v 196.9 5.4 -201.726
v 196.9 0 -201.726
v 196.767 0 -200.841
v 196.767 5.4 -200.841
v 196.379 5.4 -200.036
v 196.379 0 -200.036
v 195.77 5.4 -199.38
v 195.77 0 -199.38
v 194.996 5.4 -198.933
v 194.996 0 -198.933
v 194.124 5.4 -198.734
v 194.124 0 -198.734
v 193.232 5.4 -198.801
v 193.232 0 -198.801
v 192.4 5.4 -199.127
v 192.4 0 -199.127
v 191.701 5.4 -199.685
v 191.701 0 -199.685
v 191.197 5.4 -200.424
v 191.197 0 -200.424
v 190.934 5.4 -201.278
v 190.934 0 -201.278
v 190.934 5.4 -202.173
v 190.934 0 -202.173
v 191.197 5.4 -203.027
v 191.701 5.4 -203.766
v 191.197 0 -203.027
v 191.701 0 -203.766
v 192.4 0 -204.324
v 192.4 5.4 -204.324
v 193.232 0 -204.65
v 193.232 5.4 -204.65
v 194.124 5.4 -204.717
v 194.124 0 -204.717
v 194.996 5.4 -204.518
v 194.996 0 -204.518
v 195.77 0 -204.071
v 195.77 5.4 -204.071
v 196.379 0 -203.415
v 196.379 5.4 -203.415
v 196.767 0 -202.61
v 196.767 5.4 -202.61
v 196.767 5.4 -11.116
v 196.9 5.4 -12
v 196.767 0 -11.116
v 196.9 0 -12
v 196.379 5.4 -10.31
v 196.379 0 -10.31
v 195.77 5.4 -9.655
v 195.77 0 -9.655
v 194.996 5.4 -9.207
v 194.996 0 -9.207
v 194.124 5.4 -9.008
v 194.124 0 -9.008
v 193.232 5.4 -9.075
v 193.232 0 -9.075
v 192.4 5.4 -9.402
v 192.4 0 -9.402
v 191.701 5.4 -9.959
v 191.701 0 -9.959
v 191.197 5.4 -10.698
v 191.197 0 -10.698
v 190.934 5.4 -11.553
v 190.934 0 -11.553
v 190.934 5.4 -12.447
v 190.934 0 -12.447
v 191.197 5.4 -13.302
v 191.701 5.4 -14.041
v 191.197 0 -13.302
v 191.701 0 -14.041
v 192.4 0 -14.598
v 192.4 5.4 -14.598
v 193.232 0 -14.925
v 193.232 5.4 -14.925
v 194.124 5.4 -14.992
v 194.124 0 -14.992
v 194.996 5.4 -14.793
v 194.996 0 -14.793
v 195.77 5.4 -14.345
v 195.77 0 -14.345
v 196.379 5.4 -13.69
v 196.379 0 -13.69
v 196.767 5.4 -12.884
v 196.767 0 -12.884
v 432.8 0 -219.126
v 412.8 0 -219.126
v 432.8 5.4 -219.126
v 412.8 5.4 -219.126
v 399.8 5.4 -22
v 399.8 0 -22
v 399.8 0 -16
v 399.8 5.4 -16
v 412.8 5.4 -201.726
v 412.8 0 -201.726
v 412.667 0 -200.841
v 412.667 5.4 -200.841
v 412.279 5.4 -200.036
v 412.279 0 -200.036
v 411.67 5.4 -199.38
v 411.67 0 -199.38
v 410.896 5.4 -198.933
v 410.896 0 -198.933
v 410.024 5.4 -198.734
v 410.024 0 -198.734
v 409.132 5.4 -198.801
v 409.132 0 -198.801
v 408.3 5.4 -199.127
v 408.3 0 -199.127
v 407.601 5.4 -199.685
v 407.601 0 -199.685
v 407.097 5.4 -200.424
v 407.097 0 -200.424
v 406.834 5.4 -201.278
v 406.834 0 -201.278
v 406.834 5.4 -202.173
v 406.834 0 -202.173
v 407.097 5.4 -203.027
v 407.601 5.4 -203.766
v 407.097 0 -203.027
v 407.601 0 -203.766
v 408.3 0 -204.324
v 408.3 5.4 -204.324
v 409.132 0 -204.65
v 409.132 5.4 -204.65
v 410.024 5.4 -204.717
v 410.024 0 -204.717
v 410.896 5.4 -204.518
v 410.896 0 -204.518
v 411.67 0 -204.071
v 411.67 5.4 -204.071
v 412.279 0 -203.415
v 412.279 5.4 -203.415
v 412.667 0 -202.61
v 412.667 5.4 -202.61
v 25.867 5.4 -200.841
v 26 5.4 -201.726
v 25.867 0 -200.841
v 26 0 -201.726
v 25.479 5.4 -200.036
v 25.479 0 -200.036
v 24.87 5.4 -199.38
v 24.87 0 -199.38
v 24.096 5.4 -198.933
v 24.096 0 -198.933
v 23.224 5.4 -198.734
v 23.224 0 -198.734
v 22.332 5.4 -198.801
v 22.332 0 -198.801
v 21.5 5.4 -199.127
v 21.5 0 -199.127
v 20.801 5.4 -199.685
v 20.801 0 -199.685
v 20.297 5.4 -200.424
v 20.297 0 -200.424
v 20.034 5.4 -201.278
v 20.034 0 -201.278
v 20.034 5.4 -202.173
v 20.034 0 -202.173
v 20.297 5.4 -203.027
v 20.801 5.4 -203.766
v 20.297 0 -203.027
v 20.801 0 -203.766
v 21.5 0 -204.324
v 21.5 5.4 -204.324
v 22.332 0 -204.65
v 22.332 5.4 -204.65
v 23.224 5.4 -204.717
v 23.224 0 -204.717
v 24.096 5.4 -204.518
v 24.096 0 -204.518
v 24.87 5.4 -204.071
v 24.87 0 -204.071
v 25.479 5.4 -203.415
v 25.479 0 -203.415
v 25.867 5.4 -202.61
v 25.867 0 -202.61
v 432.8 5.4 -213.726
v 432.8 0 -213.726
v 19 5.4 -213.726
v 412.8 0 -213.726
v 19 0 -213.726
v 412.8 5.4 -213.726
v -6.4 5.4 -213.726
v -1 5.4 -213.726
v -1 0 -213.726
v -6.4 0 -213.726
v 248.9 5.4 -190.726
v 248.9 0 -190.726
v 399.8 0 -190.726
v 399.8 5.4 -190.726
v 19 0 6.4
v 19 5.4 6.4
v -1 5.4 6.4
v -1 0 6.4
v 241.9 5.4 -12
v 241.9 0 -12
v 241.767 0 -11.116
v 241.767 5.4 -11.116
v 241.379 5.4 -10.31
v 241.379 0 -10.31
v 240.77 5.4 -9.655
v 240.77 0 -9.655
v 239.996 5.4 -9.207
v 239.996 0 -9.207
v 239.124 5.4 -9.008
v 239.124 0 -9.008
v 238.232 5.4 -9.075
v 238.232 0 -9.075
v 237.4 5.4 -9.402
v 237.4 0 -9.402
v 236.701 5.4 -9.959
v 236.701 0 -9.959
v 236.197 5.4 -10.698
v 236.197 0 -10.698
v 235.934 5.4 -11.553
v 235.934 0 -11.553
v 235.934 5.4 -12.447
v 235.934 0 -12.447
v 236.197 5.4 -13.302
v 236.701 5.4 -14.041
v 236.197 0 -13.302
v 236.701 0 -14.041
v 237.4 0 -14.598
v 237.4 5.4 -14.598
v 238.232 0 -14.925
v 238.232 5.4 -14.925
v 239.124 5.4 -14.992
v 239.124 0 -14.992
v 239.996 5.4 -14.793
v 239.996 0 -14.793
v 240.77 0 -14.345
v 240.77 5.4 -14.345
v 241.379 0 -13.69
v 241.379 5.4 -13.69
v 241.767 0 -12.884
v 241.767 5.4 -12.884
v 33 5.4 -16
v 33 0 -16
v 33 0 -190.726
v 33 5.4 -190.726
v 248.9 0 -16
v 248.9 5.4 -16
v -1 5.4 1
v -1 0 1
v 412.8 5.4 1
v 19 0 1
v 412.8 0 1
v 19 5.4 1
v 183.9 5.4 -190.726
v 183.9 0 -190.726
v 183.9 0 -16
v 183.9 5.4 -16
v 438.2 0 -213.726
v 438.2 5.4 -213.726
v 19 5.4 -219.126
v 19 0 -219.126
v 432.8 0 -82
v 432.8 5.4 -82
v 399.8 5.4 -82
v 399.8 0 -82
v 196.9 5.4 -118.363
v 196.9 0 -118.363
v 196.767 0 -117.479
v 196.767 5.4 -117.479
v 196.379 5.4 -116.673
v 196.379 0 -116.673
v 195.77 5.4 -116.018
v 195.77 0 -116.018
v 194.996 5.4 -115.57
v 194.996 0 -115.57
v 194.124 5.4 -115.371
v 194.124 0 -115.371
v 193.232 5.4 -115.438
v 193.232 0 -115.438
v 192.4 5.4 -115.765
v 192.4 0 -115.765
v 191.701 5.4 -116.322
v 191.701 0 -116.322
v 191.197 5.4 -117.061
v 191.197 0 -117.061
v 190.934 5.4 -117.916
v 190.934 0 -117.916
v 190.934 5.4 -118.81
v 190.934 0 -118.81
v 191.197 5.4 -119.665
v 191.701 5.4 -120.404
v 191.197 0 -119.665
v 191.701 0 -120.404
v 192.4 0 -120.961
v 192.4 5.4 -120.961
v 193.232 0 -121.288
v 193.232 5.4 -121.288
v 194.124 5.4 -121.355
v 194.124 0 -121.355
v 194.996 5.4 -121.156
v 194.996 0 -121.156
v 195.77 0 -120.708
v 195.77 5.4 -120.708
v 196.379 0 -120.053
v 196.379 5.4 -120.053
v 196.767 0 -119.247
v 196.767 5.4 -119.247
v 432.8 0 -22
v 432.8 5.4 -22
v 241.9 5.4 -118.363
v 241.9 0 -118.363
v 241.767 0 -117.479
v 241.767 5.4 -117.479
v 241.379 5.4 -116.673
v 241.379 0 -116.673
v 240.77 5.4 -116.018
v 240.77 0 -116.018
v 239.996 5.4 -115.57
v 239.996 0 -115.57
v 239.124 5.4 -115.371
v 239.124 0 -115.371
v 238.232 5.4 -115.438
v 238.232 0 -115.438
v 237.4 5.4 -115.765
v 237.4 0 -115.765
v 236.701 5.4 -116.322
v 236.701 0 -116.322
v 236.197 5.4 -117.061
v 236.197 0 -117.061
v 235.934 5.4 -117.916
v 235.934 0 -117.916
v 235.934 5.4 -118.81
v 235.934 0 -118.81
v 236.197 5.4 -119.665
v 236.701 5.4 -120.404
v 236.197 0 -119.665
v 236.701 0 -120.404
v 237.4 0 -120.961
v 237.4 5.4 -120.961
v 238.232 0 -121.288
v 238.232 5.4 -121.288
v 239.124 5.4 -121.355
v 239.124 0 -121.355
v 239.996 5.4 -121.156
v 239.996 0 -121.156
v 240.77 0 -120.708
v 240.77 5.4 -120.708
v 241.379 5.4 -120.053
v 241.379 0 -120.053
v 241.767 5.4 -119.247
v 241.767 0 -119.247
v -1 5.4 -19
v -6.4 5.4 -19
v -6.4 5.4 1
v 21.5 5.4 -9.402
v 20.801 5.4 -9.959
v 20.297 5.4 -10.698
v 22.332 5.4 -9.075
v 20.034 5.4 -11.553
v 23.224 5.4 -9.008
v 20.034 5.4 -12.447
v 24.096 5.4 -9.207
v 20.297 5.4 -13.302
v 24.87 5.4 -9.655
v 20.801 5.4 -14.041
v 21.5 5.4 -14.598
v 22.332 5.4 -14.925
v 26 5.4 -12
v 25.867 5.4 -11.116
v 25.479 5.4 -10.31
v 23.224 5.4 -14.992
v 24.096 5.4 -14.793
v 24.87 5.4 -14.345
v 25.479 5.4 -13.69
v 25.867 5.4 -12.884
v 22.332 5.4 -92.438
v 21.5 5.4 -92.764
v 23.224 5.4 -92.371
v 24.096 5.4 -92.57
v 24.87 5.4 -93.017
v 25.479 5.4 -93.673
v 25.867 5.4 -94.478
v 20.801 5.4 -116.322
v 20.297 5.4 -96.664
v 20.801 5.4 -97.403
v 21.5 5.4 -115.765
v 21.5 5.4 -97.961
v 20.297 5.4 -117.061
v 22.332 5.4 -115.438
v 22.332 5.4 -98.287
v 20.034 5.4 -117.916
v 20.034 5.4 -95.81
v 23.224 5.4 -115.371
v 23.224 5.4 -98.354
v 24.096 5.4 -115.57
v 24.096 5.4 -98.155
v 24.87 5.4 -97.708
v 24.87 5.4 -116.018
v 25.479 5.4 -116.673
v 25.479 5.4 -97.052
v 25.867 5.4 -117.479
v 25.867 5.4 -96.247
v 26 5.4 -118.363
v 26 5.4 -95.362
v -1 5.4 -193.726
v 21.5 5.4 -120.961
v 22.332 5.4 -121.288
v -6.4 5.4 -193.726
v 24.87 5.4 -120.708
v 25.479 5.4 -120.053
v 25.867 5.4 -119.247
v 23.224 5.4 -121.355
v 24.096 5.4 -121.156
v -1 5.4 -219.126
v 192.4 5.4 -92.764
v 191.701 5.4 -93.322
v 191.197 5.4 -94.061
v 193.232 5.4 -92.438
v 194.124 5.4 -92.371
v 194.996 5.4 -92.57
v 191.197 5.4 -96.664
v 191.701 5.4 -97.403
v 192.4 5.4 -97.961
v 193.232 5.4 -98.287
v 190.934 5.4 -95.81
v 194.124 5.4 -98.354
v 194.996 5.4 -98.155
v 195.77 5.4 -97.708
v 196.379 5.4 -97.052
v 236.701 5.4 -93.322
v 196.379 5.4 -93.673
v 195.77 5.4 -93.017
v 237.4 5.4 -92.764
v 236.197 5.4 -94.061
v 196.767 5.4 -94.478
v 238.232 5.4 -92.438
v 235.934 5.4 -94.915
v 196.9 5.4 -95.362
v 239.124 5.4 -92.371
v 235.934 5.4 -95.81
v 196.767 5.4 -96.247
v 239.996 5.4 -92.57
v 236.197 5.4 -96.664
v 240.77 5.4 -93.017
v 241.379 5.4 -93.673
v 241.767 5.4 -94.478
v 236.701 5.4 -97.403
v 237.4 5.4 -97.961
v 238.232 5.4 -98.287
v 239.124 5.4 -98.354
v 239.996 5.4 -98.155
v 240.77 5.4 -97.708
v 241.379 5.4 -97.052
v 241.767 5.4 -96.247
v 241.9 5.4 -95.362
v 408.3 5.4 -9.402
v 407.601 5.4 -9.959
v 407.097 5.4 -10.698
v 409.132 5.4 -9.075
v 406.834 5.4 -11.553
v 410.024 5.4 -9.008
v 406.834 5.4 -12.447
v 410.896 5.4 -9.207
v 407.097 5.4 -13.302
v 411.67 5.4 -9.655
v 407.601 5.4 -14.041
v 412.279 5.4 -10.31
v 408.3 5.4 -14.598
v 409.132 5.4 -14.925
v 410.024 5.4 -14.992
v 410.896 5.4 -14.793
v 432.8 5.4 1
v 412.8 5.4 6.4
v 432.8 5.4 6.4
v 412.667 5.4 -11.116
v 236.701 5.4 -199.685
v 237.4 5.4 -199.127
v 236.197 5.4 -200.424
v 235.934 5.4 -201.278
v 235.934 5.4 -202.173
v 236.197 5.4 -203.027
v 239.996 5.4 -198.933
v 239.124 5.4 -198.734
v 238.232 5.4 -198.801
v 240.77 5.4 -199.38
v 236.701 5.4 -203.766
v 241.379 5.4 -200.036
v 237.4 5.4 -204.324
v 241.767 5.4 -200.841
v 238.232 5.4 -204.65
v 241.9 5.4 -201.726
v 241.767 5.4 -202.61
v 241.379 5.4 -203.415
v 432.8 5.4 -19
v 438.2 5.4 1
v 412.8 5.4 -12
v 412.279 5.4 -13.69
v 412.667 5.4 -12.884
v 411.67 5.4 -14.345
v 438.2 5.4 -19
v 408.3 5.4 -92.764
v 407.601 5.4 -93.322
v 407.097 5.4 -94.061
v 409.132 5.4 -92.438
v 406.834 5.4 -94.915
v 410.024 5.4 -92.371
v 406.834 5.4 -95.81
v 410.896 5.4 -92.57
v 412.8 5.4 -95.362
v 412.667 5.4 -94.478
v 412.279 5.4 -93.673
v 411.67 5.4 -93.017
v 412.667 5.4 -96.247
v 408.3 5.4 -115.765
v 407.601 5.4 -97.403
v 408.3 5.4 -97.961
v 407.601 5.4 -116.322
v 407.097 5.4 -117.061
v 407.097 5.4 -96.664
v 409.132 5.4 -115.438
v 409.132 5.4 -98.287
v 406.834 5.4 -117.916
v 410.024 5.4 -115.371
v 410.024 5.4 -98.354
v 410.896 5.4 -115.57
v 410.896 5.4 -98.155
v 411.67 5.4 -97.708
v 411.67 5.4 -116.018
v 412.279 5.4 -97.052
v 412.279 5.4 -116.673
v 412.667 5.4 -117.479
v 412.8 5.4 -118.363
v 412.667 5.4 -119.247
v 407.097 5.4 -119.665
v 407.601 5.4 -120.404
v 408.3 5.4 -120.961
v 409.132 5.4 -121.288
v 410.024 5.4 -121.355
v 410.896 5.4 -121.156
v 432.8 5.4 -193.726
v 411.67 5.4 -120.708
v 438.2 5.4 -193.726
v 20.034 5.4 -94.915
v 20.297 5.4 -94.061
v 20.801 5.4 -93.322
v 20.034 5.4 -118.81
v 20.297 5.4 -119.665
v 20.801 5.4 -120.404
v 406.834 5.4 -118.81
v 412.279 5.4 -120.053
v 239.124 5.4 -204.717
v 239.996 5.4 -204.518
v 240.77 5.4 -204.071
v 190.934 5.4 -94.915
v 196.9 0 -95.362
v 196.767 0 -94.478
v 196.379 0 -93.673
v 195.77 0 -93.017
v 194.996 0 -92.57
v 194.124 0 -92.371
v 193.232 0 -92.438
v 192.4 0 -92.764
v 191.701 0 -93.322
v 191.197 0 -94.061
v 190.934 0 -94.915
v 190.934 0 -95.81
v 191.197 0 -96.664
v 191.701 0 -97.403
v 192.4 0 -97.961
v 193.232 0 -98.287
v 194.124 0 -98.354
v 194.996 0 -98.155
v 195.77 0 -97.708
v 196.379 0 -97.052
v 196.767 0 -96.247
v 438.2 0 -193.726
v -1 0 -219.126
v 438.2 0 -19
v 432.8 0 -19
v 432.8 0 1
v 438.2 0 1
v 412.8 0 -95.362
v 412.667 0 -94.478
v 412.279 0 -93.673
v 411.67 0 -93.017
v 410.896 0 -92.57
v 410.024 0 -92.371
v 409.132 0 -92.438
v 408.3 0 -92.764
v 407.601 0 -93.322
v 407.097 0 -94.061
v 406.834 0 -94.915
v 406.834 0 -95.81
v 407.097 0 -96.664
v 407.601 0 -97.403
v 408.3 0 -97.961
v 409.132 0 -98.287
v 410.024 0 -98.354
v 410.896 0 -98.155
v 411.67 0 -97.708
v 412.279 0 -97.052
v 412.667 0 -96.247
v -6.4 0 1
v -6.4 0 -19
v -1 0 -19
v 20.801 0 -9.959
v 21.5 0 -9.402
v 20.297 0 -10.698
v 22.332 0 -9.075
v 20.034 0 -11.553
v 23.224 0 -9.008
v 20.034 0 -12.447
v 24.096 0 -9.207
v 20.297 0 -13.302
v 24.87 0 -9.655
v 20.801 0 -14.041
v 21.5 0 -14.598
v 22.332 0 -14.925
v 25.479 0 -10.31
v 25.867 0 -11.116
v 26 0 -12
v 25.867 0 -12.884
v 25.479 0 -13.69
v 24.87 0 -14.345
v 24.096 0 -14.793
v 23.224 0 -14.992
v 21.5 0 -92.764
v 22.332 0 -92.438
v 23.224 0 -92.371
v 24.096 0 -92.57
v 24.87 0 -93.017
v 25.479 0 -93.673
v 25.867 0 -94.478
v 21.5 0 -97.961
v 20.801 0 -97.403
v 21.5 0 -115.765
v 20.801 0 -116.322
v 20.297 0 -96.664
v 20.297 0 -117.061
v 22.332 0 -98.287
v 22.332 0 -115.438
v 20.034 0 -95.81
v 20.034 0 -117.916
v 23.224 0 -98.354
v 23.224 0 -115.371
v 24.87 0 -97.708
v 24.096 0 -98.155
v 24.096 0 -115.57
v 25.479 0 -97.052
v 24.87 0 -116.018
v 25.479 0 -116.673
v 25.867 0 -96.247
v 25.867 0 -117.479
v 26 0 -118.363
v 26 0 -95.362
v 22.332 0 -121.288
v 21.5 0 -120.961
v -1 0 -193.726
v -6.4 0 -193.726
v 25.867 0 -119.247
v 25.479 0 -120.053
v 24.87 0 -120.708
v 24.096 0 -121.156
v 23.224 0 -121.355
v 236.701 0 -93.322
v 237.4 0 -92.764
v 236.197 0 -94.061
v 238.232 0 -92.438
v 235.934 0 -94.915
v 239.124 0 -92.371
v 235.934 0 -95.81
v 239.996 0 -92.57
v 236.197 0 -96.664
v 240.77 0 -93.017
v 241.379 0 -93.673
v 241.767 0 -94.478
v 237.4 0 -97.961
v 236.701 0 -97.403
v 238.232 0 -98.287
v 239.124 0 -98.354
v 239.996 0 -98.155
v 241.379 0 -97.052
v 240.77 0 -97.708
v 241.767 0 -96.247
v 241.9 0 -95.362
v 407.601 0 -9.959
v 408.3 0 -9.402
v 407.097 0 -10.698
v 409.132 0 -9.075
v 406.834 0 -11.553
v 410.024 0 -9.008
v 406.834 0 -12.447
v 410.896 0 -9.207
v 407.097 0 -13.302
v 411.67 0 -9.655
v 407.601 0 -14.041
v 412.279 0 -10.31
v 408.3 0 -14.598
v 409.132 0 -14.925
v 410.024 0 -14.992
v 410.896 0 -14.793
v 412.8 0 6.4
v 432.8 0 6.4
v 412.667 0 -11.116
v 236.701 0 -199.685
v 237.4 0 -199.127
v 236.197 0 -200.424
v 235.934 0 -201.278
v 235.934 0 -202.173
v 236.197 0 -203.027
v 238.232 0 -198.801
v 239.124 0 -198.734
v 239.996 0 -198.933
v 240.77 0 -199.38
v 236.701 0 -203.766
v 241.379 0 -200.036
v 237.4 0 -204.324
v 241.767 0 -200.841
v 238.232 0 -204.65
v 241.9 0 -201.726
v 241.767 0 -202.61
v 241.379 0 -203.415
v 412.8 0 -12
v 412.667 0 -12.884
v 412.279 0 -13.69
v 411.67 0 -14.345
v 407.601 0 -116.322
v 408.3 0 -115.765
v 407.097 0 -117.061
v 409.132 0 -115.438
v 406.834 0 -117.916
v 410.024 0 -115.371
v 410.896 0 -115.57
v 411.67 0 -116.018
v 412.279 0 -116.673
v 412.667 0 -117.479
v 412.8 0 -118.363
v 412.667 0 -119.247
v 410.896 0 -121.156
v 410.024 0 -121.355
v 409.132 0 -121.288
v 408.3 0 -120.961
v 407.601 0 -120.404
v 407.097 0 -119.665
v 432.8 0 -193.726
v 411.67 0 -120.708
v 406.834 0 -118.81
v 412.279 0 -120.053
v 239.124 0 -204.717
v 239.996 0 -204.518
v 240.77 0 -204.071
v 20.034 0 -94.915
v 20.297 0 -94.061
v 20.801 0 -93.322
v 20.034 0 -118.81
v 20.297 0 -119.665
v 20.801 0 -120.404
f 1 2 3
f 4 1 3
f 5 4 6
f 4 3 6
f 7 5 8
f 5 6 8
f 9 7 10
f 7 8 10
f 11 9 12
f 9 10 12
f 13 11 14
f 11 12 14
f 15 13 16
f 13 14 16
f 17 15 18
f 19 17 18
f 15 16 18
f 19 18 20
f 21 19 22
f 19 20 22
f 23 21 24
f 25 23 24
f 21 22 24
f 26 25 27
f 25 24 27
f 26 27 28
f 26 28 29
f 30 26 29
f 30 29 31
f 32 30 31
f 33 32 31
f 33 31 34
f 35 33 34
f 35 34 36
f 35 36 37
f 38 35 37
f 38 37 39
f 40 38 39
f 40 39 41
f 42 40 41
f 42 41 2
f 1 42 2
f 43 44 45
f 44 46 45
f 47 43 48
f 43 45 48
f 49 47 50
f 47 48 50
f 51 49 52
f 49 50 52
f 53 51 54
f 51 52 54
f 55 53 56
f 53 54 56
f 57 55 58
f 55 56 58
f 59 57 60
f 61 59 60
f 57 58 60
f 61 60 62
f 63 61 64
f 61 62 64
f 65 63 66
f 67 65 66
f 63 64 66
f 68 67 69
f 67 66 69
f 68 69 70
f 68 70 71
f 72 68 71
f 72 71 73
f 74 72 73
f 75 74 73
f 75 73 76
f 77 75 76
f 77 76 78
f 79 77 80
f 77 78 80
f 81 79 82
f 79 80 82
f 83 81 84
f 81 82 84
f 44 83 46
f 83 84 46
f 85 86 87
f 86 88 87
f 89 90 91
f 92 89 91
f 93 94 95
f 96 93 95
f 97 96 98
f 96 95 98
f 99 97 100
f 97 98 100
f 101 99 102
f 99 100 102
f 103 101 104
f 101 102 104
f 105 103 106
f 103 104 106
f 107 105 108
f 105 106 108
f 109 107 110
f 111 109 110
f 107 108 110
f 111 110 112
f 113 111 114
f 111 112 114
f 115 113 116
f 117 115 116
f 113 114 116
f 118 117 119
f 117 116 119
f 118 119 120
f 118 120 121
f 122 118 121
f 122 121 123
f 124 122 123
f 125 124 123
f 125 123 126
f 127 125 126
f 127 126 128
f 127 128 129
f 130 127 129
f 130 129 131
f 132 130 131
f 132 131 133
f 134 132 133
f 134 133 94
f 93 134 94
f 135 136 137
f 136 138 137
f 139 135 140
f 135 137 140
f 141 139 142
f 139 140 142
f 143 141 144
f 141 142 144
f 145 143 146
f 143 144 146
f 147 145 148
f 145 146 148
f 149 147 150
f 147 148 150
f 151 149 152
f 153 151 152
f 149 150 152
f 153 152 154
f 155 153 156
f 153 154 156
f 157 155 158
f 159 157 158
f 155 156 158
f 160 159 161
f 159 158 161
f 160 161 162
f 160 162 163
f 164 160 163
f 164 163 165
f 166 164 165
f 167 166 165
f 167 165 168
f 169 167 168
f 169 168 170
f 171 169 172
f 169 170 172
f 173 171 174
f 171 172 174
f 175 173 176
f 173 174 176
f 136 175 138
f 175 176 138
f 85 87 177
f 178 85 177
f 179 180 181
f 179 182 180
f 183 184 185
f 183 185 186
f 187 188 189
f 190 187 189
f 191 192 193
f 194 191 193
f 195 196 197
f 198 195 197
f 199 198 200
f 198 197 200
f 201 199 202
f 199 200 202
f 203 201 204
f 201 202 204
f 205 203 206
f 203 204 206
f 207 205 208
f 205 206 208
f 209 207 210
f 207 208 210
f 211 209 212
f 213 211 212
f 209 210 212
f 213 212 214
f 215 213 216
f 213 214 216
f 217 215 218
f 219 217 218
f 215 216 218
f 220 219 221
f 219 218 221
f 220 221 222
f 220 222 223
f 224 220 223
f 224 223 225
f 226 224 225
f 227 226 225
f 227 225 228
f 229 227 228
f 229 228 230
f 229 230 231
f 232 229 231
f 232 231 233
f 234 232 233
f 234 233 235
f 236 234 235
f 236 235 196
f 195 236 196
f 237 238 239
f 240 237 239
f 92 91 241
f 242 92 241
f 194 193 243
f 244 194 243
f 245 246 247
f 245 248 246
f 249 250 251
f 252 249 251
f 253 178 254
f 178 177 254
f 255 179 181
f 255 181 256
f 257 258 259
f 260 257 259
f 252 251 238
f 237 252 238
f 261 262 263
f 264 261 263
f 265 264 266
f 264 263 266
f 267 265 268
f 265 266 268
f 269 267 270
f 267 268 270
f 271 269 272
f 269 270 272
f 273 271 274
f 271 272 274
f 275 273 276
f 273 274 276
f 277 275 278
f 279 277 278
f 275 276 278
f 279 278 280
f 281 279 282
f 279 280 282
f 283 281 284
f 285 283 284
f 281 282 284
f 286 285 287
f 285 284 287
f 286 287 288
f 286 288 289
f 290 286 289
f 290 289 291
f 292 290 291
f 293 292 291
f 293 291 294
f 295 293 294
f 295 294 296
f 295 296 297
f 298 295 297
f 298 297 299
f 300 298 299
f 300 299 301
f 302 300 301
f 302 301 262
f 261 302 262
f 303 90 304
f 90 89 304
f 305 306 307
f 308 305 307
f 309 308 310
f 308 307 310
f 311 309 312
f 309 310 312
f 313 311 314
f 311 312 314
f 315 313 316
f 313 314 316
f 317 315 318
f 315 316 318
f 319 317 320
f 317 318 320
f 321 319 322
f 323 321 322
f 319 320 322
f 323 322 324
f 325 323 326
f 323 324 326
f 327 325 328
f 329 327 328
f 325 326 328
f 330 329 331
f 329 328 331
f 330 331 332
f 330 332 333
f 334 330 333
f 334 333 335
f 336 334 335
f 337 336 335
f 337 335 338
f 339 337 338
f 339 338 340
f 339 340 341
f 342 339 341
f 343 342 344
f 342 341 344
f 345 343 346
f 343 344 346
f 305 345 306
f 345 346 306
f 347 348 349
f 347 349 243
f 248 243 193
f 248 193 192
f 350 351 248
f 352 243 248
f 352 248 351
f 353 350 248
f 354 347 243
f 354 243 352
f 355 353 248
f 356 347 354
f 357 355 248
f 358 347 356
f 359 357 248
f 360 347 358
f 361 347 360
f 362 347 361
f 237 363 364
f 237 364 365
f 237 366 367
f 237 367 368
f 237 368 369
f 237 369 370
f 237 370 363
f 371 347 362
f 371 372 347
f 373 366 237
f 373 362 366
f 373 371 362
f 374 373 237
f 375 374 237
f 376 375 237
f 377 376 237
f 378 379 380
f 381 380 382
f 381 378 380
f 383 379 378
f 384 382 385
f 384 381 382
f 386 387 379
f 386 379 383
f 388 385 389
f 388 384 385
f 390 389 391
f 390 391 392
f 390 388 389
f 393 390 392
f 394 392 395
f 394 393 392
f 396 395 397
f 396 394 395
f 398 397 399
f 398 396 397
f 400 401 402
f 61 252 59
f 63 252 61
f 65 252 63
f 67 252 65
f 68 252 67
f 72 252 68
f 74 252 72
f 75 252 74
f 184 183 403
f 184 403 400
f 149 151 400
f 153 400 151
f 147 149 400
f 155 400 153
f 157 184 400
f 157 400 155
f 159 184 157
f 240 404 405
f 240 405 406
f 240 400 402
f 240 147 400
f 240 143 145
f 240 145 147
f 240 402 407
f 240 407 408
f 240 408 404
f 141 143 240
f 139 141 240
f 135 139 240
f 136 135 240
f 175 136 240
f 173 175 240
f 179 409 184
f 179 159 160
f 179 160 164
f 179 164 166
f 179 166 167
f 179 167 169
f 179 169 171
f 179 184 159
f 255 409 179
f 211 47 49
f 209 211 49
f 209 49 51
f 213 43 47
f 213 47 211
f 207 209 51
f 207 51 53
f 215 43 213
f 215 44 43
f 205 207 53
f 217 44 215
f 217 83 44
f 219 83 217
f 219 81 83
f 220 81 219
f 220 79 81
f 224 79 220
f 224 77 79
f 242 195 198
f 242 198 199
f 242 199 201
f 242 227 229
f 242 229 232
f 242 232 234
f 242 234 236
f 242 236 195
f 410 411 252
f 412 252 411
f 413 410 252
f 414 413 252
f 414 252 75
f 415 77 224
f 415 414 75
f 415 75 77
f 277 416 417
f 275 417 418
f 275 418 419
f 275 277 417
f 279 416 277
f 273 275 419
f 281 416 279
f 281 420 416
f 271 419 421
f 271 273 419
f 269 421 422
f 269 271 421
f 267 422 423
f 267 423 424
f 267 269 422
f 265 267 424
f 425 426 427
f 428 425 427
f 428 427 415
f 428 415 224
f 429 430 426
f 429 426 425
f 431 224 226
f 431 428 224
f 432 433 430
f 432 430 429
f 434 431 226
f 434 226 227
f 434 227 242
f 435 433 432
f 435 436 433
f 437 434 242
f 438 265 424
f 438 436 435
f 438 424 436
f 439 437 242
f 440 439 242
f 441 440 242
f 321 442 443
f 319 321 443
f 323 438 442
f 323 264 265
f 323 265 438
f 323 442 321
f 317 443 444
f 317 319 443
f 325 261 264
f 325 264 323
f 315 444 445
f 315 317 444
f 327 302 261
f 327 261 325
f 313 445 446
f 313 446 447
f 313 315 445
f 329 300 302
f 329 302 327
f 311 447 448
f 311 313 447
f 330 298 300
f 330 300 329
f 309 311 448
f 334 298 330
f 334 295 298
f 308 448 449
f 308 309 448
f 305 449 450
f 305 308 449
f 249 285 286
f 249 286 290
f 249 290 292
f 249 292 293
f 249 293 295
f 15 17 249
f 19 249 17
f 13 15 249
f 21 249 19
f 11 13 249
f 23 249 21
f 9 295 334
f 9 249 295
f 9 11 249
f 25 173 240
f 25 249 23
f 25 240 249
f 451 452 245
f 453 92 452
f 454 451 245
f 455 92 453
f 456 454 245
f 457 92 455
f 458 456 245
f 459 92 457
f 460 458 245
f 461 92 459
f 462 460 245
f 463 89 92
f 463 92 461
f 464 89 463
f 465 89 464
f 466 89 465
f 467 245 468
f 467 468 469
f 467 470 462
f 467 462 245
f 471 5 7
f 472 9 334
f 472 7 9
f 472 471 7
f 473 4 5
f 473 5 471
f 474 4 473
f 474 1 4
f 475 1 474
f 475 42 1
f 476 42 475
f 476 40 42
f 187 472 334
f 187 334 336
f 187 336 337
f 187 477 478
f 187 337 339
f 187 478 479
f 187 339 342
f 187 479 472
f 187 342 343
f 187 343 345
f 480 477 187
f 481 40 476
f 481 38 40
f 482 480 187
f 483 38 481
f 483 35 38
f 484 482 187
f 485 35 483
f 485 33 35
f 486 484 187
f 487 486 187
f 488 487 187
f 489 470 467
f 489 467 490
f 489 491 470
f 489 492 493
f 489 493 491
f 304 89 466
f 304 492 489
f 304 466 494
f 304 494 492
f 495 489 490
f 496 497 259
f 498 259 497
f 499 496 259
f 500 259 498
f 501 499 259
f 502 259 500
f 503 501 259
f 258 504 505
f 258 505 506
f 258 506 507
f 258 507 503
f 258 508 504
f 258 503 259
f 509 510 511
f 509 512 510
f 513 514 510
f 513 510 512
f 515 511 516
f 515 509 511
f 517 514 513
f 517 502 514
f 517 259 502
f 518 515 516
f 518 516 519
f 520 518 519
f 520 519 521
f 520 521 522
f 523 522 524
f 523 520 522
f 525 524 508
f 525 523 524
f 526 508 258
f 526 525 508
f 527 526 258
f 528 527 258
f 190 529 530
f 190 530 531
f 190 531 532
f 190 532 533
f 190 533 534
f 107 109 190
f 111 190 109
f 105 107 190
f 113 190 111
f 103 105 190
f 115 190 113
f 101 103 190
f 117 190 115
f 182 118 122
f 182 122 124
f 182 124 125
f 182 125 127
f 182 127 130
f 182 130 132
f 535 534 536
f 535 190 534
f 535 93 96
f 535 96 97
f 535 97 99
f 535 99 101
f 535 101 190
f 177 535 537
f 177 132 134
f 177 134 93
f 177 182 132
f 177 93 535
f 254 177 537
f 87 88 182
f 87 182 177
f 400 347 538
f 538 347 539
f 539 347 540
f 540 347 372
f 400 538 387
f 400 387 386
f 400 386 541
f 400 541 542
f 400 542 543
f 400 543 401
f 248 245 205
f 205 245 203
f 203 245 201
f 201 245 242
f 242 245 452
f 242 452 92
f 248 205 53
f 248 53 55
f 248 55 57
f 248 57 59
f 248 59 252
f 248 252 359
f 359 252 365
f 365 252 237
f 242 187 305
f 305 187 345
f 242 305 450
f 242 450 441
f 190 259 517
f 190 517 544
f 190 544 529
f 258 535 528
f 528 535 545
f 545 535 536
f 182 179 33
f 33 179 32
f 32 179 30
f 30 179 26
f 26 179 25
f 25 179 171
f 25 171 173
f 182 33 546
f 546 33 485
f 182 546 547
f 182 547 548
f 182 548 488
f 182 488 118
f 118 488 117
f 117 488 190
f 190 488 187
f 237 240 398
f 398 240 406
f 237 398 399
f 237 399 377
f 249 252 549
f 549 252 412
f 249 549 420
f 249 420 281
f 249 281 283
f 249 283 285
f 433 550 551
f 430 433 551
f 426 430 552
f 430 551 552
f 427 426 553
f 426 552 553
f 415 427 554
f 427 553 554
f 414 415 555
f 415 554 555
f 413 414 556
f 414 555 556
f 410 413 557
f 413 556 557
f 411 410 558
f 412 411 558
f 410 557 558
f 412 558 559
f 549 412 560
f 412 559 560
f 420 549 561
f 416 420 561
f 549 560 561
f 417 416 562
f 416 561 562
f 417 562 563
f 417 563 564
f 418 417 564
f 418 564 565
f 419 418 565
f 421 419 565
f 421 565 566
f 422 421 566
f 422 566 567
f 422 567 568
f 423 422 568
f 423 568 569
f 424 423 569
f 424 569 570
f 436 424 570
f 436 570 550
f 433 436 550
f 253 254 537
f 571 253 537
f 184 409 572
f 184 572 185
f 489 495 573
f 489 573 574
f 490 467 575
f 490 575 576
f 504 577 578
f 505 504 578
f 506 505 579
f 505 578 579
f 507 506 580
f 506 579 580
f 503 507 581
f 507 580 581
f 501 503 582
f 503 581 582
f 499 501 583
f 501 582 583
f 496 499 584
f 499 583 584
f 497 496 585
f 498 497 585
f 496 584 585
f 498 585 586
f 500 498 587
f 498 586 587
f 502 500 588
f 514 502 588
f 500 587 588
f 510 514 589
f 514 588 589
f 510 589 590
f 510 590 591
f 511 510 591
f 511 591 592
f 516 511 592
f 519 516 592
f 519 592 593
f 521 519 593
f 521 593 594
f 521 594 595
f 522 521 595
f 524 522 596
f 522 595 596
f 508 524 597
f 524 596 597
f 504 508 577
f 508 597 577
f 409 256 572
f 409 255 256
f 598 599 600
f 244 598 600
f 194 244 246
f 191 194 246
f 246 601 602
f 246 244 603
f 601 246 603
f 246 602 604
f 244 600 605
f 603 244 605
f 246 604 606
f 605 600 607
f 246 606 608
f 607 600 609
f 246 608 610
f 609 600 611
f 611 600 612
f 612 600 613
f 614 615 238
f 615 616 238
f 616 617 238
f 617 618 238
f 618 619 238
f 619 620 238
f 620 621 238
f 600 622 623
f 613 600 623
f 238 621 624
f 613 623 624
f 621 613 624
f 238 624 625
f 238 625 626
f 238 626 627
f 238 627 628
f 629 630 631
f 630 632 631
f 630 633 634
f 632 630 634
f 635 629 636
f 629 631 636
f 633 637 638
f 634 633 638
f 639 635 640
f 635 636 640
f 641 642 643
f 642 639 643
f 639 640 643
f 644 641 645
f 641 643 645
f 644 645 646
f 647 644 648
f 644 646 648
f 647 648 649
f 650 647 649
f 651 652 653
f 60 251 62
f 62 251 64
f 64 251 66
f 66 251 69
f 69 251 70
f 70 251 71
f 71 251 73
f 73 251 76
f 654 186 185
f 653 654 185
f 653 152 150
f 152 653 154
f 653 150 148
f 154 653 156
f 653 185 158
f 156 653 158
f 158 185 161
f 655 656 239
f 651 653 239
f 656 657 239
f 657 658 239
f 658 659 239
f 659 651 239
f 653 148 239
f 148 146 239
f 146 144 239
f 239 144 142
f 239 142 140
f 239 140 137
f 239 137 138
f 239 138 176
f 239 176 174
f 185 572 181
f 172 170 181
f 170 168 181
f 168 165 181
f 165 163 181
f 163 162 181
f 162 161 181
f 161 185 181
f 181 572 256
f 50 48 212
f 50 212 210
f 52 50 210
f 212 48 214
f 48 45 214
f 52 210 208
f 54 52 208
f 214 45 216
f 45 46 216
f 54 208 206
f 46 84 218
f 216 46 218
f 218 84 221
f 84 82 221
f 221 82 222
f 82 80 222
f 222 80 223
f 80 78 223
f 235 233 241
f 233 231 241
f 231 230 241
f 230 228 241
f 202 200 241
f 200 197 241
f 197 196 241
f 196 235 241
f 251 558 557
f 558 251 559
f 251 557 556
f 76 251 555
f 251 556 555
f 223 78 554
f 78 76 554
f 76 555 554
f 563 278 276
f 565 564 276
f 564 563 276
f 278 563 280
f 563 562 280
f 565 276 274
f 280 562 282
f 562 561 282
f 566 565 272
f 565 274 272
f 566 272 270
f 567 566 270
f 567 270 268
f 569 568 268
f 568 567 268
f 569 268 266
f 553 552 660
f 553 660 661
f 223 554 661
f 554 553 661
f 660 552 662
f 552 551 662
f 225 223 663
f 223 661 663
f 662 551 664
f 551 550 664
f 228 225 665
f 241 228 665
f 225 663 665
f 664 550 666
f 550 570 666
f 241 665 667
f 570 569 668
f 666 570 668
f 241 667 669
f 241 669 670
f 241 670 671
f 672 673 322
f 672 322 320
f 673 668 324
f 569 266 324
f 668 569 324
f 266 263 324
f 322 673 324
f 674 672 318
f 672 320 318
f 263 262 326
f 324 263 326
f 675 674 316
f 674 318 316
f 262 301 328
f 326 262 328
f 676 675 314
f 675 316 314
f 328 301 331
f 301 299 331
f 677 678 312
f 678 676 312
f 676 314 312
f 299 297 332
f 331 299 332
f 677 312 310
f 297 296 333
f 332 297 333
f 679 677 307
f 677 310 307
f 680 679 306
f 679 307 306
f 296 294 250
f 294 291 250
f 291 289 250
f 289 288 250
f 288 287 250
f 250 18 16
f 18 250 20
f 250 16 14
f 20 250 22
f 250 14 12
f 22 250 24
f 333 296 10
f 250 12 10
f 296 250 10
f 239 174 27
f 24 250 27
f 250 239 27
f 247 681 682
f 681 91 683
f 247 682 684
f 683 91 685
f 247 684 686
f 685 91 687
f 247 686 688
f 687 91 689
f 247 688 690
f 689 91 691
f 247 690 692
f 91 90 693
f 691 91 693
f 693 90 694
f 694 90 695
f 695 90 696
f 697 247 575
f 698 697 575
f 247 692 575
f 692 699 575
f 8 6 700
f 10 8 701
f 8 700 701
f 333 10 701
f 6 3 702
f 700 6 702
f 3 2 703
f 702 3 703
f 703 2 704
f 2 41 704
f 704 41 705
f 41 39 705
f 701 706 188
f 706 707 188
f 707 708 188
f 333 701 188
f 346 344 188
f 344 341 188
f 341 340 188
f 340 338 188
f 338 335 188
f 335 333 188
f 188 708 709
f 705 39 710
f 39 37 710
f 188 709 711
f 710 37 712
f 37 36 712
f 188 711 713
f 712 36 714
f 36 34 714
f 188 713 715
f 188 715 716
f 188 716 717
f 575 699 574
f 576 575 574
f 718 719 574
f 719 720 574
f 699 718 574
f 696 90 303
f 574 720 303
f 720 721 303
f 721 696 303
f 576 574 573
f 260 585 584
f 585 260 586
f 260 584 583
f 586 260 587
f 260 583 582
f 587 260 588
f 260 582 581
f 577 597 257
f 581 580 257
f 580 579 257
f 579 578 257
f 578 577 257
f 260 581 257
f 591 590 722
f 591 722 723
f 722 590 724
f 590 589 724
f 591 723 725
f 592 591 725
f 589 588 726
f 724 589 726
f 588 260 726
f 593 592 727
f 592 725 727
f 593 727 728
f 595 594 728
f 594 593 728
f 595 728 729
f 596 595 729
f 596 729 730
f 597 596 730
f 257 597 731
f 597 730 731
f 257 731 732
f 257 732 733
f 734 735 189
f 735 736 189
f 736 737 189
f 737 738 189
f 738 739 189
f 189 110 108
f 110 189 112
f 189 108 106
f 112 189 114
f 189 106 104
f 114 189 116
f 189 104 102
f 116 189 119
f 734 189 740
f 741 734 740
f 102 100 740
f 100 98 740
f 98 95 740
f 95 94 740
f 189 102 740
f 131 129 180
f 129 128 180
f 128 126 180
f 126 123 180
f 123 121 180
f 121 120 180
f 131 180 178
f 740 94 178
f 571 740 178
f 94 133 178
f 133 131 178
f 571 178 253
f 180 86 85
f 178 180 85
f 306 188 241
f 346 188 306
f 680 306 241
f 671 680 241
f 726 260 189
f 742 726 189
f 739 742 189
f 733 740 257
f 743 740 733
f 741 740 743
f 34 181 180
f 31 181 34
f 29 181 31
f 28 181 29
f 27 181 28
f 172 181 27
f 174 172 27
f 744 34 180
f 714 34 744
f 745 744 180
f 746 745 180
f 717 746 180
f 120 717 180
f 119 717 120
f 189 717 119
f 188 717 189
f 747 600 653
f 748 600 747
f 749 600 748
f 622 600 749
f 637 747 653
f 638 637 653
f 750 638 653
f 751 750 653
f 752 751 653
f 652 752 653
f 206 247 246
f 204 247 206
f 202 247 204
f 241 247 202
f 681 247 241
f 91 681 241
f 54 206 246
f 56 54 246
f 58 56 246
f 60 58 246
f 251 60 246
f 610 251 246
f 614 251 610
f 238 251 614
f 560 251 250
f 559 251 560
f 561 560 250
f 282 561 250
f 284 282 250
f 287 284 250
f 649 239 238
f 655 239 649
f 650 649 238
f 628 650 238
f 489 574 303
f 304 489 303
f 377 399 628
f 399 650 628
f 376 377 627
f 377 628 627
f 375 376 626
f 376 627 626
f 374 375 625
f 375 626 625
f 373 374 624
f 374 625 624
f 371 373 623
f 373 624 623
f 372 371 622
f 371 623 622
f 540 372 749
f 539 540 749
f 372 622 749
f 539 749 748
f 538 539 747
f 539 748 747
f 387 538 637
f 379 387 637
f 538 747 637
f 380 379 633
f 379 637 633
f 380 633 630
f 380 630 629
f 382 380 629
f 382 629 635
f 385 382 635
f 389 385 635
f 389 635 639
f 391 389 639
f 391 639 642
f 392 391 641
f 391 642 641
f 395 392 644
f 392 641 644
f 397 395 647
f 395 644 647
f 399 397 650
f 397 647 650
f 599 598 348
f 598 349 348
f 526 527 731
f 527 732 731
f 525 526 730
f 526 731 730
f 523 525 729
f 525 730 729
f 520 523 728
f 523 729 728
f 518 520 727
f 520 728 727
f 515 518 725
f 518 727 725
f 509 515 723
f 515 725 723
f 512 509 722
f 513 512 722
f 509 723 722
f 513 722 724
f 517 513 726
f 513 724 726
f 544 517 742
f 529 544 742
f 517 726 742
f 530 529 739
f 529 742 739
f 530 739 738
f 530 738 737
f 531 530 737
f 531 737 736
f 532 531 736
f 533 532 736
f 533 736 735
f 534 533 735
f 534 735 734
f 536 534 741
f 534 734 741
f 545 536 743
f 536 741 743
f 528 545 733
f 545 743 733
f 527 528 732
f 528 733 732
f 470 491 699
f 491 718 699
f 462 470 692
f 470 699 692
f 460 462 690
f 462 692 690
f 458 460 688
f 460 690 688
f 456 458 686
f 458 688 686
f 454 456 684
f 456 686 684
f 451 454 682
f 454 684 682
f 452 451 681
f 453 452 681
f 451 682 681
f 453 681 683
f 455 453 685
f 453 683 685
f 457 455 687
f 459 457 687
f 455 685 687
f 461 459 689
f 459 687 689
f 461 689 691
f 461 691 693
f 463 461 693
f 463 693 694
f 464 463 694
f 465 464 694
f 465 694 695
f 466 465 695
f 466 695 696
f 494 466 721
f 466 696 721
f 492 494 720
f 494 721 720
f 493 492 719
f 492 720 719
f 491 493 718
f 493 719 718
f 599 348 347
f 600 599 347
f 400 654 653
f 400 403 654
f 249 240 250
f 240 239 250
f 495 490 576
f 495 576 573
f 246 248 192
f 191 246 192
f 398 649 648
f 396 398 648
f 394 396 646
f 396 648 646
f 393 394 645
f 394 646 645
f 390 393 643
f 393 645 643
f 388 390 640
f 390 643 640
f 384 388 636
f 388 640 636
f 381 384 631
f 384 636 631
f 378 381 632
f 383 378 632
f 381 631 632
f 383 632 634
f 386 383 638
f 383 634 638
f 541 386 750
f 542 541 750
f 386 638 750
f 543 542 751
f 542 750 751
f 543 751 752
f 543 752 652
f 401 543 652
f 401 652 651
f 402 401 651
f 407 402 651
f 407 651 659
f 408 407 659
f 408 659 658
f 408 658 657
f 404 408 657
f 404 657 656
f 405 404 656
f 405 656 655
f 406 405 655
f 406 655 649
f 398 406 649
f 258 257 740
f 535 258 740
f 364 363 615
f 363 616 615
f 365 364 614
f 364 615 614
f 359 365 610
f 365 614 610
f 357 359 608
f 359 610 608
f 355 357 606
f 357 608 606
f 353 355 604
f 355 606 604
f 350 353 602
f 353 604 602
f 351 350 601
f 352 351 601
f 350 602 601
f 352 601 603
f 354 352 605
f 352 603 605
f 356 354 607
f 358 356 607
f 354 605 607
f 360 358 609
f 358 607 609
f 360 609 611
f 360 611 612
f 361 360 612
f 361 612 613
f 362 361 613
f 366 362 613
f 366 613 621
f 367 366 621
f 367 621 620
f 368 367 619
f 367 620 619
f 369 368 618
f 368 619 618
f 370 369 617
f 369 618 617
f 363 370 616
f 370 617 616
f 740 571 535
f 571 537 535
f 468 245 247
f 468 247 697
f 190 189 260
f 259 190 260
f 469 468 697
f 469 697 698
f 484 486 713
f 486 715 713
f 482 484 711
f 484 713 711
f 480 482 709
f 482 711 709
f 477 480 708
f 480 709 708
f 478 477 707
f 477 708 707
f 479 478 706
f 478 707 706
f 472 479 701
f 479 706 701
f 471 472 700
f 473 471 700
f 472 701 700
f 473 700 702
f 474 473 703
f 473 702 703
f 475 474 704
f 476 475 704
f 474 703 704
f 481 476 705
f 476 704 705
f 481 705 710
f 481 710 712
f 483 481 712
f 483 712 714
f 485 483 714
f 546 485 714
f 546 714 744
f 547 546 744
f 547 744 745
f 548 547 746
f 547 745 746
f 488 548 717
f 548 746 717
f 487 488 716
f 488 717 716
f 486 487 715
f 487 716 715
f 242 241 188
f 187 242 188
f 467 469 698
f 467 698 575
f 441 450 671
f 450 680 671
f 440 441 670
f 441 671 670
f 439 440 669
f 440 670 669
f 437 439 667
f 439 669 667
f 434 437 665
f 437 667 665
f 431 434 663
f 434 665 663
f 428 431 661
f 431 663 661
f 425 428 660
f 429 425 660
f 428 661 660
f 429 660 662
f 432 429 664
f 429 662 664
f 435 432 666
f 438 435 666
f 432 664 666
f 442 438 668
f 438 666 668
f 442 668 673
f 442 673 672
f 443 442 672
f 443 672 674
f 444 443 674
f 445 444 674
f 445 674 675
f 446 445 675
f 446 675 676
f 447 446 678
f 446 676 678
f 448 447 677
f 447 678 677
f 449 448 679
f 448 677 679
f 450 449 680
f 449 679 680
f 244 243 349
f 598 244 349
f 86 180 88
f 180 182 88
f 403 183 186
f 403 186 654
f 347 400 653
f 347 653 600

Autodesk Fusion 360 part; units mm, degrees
sketch "Sketch1" plane through (0, 0, 0) normal (0, 1, 0) x (1, 0, 0)
  line L0 (193.9, 118.363) -> (193.9, 201.7255) construction
  line L1 (183.9, 190.7255) -> (183.9, 16)
  line L2 (23, 201.7255) -> (23, 118.363) construction
  line L3 (23, 12) -> (193.9, 12) construction
  circle A0 centre (23, 12) radius 3
  circle A1 centre (238.9, 12) radius 3
  line L4 (193.9, 95.3625) -> (23, 95.3625) construction
  line L5 (399.8, 190.7255) -> (399.8, 16)
  circle A2 centre (238.9, 95.3625) radius 3
  circle A3 centre (23, 201.7255) radius 3
  line L6 (33, 16) -> (33, 190.7255)
  line L7 (0, 212.7255) -> (0, 106.363) construction
  circle A4 centre (23, 118.363) radius 3
  circle A5 centre (193.9, 201.7255) radius 3
  circle A6 centre (23, 95.3625) radius 3
  line L8 (0, 106.3625) -> (0, 0) construction
  circle A7 centre (193.9, 95.3625) radius 3
  line L9 (23, 118.363) -> (193.9, 118.363) construction
  line L10 (193.9, 12) -> (193.9, 95.3625) construction
  circle A8 centre (193.9, 118.363) radius 3
  circle A9 centre (193.9, 12) radius 3
  line L11 (183.9, 16) -> (33, 16)
  line L12 (215.9, 0) -> (215.9, 106.3625) construction
  circle A10 centre (409.8, 118.363) radius 3
  line L13 (238.9, 118.363) -> (409.8, 118.363) construction
  line L14 (23, 95.3625) -> (23, 12) construction
  line L15 (215.9, 0) -> (431.8, 0) construction
  line L16 (431.8, 0) -> (431.8, 106.3625) construction
  line L17 (0, 106.363) -> (215.9, 106.363) construction
  circle A11 centre (409.8, 201.7255) radius 3
  line L18 (215.9, 106.3625) -> (0, 106.3625) construction
  line L19 (409.8, 201.7255) -> (238.9, 201.7255) construction
  line L20 (409.8, 12) -> (409.8, 95.3625) construction
  line L21 (215.9, 212.7255) -> (0, 212.7255) construction
  line L22 (0, 0) -> (215.9, 0) construction
  line L23 (215.9, 106.3625) -> (215.9, 0) construction
  circle A12 centre (409.8, 12) radius 3
  line L24 (215.9, 106.363) -> (431.8, 106.363) construction
  line L25 (409.8, 118.363) -> (409.8, 201.7255) construction
  line L26 (215.9, 106.363) -> (215.9, 212.7255) construction
  line L27 (238.9, 95.3625) -> (238.9, 12) construction
  circle A13 centre (409.8, 95.3625) radius 3
  line L28 (238.9, 12) -> (409.8, 12) construction
  line L29 (248.9, 16) -> (248.9, 190.7255)
  line L30 (248.9, 190.7255) -> (399.8, 190.7255)
  line L31 (431.8, 106.363) -> (431.8, 212.7255) construction
  line L32 (399.8, 16) -> (248.9, 16)
  line L33 (431.8, 212.7255) -> (215.9, 212.7255) construction
  line L34 (409.8, 95.3625) -> (238.9, 95.3625) construction
  line L35 (193.9, 201.7255) -> (23, 201.7255) construction
  line L36 (431.8, 106.3625) -> (215.9, 106.3625) construction
  line L37 (33, 190.7255) -> (183.9, 190.7255)
  circle A14 centre (238.9, 118.363) radius 3
  circle A15 centre (238.9, 201.7255) radius 3
  line L38 (238.9, 201.7255) -> (238.9, 118.363) construction
  line L39 (215.9, 212.7255) -> (215.9, 106.363) construction
  line L40 (432.8, 122.8753) -> (432.8, 213.7255)
  line L41 (432.8, 213.7255) -> (215.9, 213.7255)
  line L42 (215.9, 213.7255) -> (-1, 213.7255)
  line L43 (-1, 213.7255) -> (-1, 97.8373)
  line L44 (-1, 97.8373) -> (-1, -1)
  line L45 (-1, -1) -> (215.9, -1)
  line L46 (215.9, -1) -> (432.8, -1)
  line L47 (432.8, -1) -> (432.8, 122.8753)
  point P0 (215.9, 106.363)
  point P1 (0, 106.363)
  point P2 (215.9, 0)
  dimension "d3" = 215.9
  dimension "d4" = 106.363
  dimension "d5" = 106.3625
  dimension "d6" = 215.9
  dimension "d7" = 23
  dimension "d8" = 11
  dimension "d9" = 12
  dimension "d10" = 22
  dimension "d11" = 6
  dimension "d12" = 6
  dimension "d13" = 6
  dimension "d14" = 6
  dimension "d15" = 10
  dimension "d16" = 11
  dimension "d17" = 4
  dimension "d18" = 10
  dimension "d19" = 10
  dimension "d20" = 11
  dimension "d21" = 10
  dimension "d22" = 4
  dimension "d23" = 1
  dimension "d24" = 1
extrude "Extrude1" add sketch "Sketch1" along normal blind 5.4
sketch "Sketch2" plane through (0, 5.4, 0) normal (0, 1, 0) x (-1, 0, 0)
  circle A0 centre (-409.8, -12) radius 3
  circle A1 centre (-23, -95.3625) radius 3
  circle A2 centre (-409.8, -201.7255) radius 3
  circle A3 centre (-409.8, -95.3625) radius 3
  circle A4 centre (-238.9, -118.363) radius 3
  circle A5 centre (-238.9, -201.7255) radius 3
  circle A6 centre (-23, -12) radius 3
  circle A7 centre (-193.9, -201.7255) radius 3
  circle A8 centre (-193.9, -95.3625) radius 3
  line L0 (-399.8, -190.7255) -> (-399.8, -16)
  line L1 (-399.8, -16) -> (-248.9, -16)
  line L2 (-248.9, -16) -> (-248.9, -190.7255)
  line L3 (-248.9, -190.7255) -> (-399.8, -190.7255)
  circle A9 centre (-23, -201.7255) radius 3
  line L4 (-33, -16) -> (-33, -190.7255)
  line L5 (-33, -190.7255) -> (-183.9, -190.7255)
  line L6 (-183.9, -190.7255) -> (-183.9, -16)
  line L7 (-183.9, -16) -> (-33, -16)
  circle A10 centre (-23, -118.363) radius 3
  circle A11 centre (-238.9, -12) radius 3
  circle A12 centre (-238.9, -95.3625) radius 3
  circle A13 centre (-193.9, -118.363) radius 3
  circle A14 centre (-409.8, -118.363) radius 3
  circle A15 centre (-193.9, -12) radius 3
  line L8 (-432.8, 1) -> (-432.8, -122.8753)
  line L9 (-432.8, -122.8753) -> (-432.8, -213.7255)
  line L10 (-432.8, -213.7255) -> (1, -213.7255)
  line L11 (1, -213.7255) -> (1, -97.8373)
  line L12 (1, -97.8373) -> (1, 1)
  line L13 (1, 1) -> (-432.8, 1)
  line L14 (-399.8, -22) -> (-432.8, -22)
  line L15 (-432.8, -22) -> (-432.8, -82)
  line L16 (-432.8, -82) -> (-399.8, -82)
  line L17 (-399.8, -82) -> (-399.8, -22)
  dimension "d27" = 60
  dimension "d65" = 6
  dimension "d66" = 60
extrude "Extrude2" cut sketch "Sketch2" against normal blind 20 contours L0 L8 L14 L15 L16 L17
sketch "Sketch3" plane through (0, 5.4, 0) normal (0, 1, 0) x (-1, 0, 0)
  circle A0 centre (-193.9, -12) radius 3
  circle A1 centre (-409.8, -118.363) radius 3
  circle A2 centre (-193.9, -118.363) radius 3
  circle A3 centre (-238.9, -95.3625) radius 3
  circle A4 centre (-238.9, -12) radius 3
  circle A5 centre (-23, -118.363) radius 3
  line L0 (-33, -16) -> (-33, -190.7255)
  line L1 (-33, -190.7255) -> (-183.9, -190.7255)
  line L2 (-183.9, -190.7255) -> (-183.9, -16)
  line L3 (-183.9, -16) -> (-33, -16)
  circle A6 centre (-23, -201.7255) radius 3
  line L4 (-432.8, -22) -> (-399.8, -22)
  line L5 (-248.9, -16) -> (-248.9, -190.7255)
  line L6 (-248.9, -190.7255) -> (-399.8, -190.7255)
  line L7 (-399.8, -22) -> (-399.8, -16)
  line L8 (-399.8, -82) -> (-432.8, -82)
  line L9 (-432.8, -82) -> (-432.8, -122.8753)
  line L10 (-432.8, -122.8753) -> (-432.8, -213.7255)
  line L11 (-432.8, -213.7255) -> (1, -213.7255)
  line L12 (1, -213.7255) -> (1, -97.8373)
  line L13 (1, -97.8373) -> (1, 1)
  line L14 (1, 1) -> (-432.8, 1)
  line L15 (-432.8, 1) -> (-432.8, -22)
  circle A7 centre (-193.9, -95.3625) radius 3
  circle A8 centre (-193.9, -201.7255) radius 3
  circle A9 centre (-23, -12) radius 3
  circle A10 centre (-238.9, -201.7255) radius 3
  circle A11 centre (-238.9, -118.363) radius 3
  circle A12 centre (-409.8, -95.3625) radius 3
  circle A13 centre (-409.8, -201.7255) radius 3
  circle A14 centre (-23, -95.3625) radius 3
  circle A15 centre (-409.8, -12) radius 3
  line L16 (1, -213.7255) -> (6.4, -213.7255)
  line L17 (6.4, -213.7255) -> (6.4, -193.7255)
  line L18 (6.4, -193.7255) -> (1, -193.7255)
  line L19 (1, -193.7255) -> (1, -213.7255)
  line L20 (1, 1) -> (6.4, 1)
  line L21 (6.4, 1) -> (6.4, -19)
  line L22 (6.4, -19) -> (1, -19)
  line L23 (1, -19) -> (1, 1)
  line L24 (1, 1) -> (-19, 1)
  line L25 (-19, 1) -> (-19, 6.4)
  line L26 (-19, 6.4) -> (1, 6.4)
  line L27 (1, 6.4) -> (1, 1)
  line L28 (1, -213.7255) -> (-19, -213.7255)
  line L29 (-19, -213.7255) -> (-19, -219.1255)
  line L30 (-19, -219.1255) -> (1, -219.1255)
  line L31 (1, -219.1255) -> (1, -213.7255)
  line L32 (-432.8, -213.7255) -> (-412.8, -213.7255)
  line L33 (-412.8, -213.7255) -> (-412.8, -219.1255)
  line L34 (-412.8, -219.1255) -> (-432.8, -219.1255)
  line L35 (-432.8, -219.1255) -> (-432.8, -213.7255)
  line L36 (-432.8, -213.7255) -> (-438.2, -213.7255)
  line L37 (-438.2, -213.7255) -> (-438.2, -193.7255)
  line L38 (-438.2, -193.7255) -> (-432.8, -193.7255)
  line L39 (-432.8, -193.7255) -> (-432.8, -213.7255)
  line L40 (-432.8, 1) -> (-438.2, 1)
  line L41 (-438.2, 1) -> (-438.2, -19)
  line L42 (-438.2, -19) -> (-432.8, -19)
  line L43 (-432.8, -19) -> (-432.8, 1)
  line L44 (-432.8, 1) -> (-412.8, 1)
  line L45 (-412.8, 1) -> (-412.8, 6.4)
  line L46 (-412.8, 6.4) -> (-432.8, 6.4)
  line L47 (-432.8, 6.4) -> (-432.8, 1)
  line L48 (-399.8, -16) -> (-248.9, -16)
  line L49 (-399.8, -190.7255) -> (-399.8, -82)
  dimension "d30" = 5.4
  dimension "d31" = 20
  dimension "d32" = 5.4
  dimension "d33" = 20
  dimension "d34" = 20
  dimension "d35" = 5.4
  dimension "d36" = 5.4
  dimension "d37" = 20
  dimension "d38" = 20
  dimension "d39" = 5.4
  dimension "d40" = 5.4
  dimension "d41" = 20
  dimension "d42" = 5.4
  dimension "d43" = 20
  dimension "d44" = 20
  dimension "d45" = 5.4
  dimension "d63" = 433.8
extrude "Extrude3" add sketch "Sketch3" against normal blind 5.4 contours A0 | A1 | A2 | A3 | A4 | A5 | A6 | L4 L5 L6 L7 L8 L9 L10 L11 L12 L13 L14 L15 L19 L23 L24 L28 L32 L39 L43 L44 L48 L49 | L15 L40 L41 L42 L43 | L14 L44 L45 L46 L47 | L14 L24 L25 L26 L27 | L13 L20 L21 L22 L23 | L12 L16 L17 L18 L19 | L10 L36 L37 L38 L39 | L11 L28 L29 L30 L31 | L11 L32 L33 L34 L35 | A7 | A8 | A9 | A10 | A11 | A12 | A13 | A14 | A15
extrude "Extrude5" cut sketch "Sketch1" along normal blind 30 contours A0 | A1 | A2 | A3 | A4 | A5 | A6 | A7 | A8 | A9 | A10 | A11 | A12 | A13 | A14 | A15
sketch "export" plane through (0, 5.4, 0) normal (0, 1, 0) x (-1, 0, 0)
  circle A0 centre (-23, -118.363) radius 3
  circle A1 centre (-409.8, -201.7255) radius 3
  circle A2 centre (-193.9, -12) radius 3
  circle A3 centre (-238.9, -118.363) radius 3
  circle A4 centre (-193.9, -118.363) radius 3
  circle A5 centre (-409.8, -12) radius 3
  circle A6 centre (-238.9, -201.7255) radius 3
  circle A7 centre (-23, -95.3625) radius 3
  circle A8 centre (-23, -201.7255) radius 3
  circle A9 centre (-409.8, -118.363) radius 3
  circle A10 centre (-238.9, -12) radius 3
  circle A11 centre (-238.9, -95.3625) radius 3
  circle A12 centre (-193.9, -95.3625) radius 3
  circle A13 centre (-409.8, -95.3625) radius 3
  circle A14 centre (-193.9, -201.7255) radius 3
  circle A15 centre (-23, -12) radius 3
  line L0 (-33, -16) -> (-33, -190.7255)
  line L1 (-33, -190.7255) -> (-183.9, -190.7255)
  line L2 (-183.9, -190.7255) -> (-183.9, -16)
  line L3 (-183.9, -16) -> (-33, -16)
  line L4 (-432.8, -22) -> (-399.8, -22)
  line L5 (-399.8, -22) -> (-399.8, -16)
  line L6 (-399.8, -16) -> (-248.9, -16)
  line L7 (-248.9, -16) -> (-248.9, -190.7255)
  line L8 (-248.9, -190.7255) -> (-399.8, -190.7255)
  line L9 (-399.8, -190.7255) -> (-399.8, -82)
  line L10 (-399.8, -82) -> (-432.8, -82)
  line L11 (-432.8, -82) -> (-432.8, -122.8753)
  line L12 (-432.8, -122.8753) -> (-432.8, -193.7255)
  line L13 (-432.8, -193.7255) -> (-438.2, -193.7255)
  line L14 (-438.2, -193.7255) -> (-438.2, -213.7255)
  line L15 (-438.2, -213.7255) -> (-432.8, -213.7255)
  line L16 (-432.8, -213.7255) -> (-432.8, -219.1255)
  line L17 (-432.8, -219.1255) -> (-412.8, -219.1255)
  line L18 (-412.8, -219.1255) -> (-412.8, -213.7255)
  line L19 (-412.8, -213.7255) -> (-19, -213.7255)
  line L20 (-19, -213.7255) -> (-19, -219.1255)
  line L21 (-19, -219.1255) -> (1, -219.1255)
  line L22 (1, -219.1255) -> (1, -213.7255)
  line L23 (1, -213.7255) -> (6.4, -213.7255)
  line L24 (6.4, -213.7255) -> (6.4, -193.7255)
  line L25 (6.4, -193.7255) -> (1, -193.7255)
  line L26 (1, -193.7255) -> (1, -97.8373)
  line L27 (1, -97.8373) -> (1, -19)
  line L28 (1, -19) -> (6.4, -19)
  line L29 (6.4, -19) -> (6.4, 1)
  line L30 (6.4, 1) -> (1, 1)
  line L31 (1, 1) -> (1, 6.4)
  line L32 (1, 6.4) -> (-19, 6.4)
  line L33 (-19, 6.4) -> (-19, 1)
  line L34 (-19, 1) -> (-412.8, 1)
  line L35 (-412.8, 1) -> (-412.8, 6.4)
  line L36 (-412.8, 6.4) -> (-432.8, 6.4)
  line L37 (-432.8, 6.4) -> (-432.8, 1)
  line L38 (-432.8, 1) -> (-438.2, 1)
  line L39 (-438.2, 1) -> (-438.2, -19)
  line L40 (-438.2, -19) -> (-432.8, -19)
  line L41 (-432.8, -19) -> (-432.8, -22)
equation "d17 = 11.00 mm - 7 mm"
equation "d22 = d17"
equation "d30 = d36"
equation "d31 = d33"
equation "d32 = d36"
equation "d34 = d33"
equation "d35 = d36"
equation "d37 = d33"
equation "d38 = d33"
equation "d39 = d36"
equation "d40 = d36"
equation "d41 = d33"
equation "d42 = d36"
equation "d43 = d33"
equation "d44 = d33"
equation "d45 = d42"
equation "d48 = d33"
equation "d50 = ( d63 - d48 ) / 2"
equation "d66 = d27"
